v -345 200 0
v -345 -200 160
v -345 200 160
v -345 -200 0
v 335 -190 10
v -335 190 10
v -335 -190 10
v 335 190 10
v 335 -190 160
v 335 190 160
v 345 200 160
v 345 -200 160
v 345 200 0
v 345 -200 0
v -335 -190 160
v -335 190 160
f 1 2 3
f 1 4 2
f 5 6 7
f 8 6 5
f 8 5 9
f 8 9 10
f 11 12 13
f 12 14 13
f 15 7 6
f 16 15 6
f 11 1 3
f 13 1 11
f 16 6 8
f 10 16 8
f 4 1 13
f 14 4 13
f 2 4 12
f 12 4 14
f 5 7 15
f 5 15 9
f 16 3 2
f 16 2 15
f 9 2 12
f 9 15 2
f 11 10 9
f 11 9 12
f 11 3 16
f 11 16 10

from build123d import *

# Parameters (mm, degrees)
SCHIZZO1_W                   = 690
SCHIZZO1_H                   = 400
ESTRUSIONE_ESTRUSIONE1_DEPTH = 10
SCHIZZO2_W                   = 690
SCHIZZO2_H                   = 400
SCHIZZO2_W_2                 = 670
SCHIZZO2_H_2                 = 380
ESTRUSIONE_ESTRUSIONE2_DEPTH = 150


with BuildPart() as part:
    # Schizzo1 → Estrusione-Estrusione1 (new body)
    with BuildSketch(Plane.XY):
        Rectangle(SCHIZZO1_W, SCHIZZO1_H)
    extrude(amount=ESTRUSIONE_ESTRUSIONE1_DEPTH)

    # Schizzo2 → Estrusione-Estrusione2 (add)
    with BuildSketch(Plane.XY.offset(10)):
        Rectangle(SCHIZZO2_W, SCHIZZO2_H)
        Rectangle(SCHIZZO2_W_2, SCHIZZO2_H_2, mode=Mode.SUBTRACT)
    extrude(amount=ESTRUSIONE_ESTRUSIONE2_DEPTH)


solid = part.part
